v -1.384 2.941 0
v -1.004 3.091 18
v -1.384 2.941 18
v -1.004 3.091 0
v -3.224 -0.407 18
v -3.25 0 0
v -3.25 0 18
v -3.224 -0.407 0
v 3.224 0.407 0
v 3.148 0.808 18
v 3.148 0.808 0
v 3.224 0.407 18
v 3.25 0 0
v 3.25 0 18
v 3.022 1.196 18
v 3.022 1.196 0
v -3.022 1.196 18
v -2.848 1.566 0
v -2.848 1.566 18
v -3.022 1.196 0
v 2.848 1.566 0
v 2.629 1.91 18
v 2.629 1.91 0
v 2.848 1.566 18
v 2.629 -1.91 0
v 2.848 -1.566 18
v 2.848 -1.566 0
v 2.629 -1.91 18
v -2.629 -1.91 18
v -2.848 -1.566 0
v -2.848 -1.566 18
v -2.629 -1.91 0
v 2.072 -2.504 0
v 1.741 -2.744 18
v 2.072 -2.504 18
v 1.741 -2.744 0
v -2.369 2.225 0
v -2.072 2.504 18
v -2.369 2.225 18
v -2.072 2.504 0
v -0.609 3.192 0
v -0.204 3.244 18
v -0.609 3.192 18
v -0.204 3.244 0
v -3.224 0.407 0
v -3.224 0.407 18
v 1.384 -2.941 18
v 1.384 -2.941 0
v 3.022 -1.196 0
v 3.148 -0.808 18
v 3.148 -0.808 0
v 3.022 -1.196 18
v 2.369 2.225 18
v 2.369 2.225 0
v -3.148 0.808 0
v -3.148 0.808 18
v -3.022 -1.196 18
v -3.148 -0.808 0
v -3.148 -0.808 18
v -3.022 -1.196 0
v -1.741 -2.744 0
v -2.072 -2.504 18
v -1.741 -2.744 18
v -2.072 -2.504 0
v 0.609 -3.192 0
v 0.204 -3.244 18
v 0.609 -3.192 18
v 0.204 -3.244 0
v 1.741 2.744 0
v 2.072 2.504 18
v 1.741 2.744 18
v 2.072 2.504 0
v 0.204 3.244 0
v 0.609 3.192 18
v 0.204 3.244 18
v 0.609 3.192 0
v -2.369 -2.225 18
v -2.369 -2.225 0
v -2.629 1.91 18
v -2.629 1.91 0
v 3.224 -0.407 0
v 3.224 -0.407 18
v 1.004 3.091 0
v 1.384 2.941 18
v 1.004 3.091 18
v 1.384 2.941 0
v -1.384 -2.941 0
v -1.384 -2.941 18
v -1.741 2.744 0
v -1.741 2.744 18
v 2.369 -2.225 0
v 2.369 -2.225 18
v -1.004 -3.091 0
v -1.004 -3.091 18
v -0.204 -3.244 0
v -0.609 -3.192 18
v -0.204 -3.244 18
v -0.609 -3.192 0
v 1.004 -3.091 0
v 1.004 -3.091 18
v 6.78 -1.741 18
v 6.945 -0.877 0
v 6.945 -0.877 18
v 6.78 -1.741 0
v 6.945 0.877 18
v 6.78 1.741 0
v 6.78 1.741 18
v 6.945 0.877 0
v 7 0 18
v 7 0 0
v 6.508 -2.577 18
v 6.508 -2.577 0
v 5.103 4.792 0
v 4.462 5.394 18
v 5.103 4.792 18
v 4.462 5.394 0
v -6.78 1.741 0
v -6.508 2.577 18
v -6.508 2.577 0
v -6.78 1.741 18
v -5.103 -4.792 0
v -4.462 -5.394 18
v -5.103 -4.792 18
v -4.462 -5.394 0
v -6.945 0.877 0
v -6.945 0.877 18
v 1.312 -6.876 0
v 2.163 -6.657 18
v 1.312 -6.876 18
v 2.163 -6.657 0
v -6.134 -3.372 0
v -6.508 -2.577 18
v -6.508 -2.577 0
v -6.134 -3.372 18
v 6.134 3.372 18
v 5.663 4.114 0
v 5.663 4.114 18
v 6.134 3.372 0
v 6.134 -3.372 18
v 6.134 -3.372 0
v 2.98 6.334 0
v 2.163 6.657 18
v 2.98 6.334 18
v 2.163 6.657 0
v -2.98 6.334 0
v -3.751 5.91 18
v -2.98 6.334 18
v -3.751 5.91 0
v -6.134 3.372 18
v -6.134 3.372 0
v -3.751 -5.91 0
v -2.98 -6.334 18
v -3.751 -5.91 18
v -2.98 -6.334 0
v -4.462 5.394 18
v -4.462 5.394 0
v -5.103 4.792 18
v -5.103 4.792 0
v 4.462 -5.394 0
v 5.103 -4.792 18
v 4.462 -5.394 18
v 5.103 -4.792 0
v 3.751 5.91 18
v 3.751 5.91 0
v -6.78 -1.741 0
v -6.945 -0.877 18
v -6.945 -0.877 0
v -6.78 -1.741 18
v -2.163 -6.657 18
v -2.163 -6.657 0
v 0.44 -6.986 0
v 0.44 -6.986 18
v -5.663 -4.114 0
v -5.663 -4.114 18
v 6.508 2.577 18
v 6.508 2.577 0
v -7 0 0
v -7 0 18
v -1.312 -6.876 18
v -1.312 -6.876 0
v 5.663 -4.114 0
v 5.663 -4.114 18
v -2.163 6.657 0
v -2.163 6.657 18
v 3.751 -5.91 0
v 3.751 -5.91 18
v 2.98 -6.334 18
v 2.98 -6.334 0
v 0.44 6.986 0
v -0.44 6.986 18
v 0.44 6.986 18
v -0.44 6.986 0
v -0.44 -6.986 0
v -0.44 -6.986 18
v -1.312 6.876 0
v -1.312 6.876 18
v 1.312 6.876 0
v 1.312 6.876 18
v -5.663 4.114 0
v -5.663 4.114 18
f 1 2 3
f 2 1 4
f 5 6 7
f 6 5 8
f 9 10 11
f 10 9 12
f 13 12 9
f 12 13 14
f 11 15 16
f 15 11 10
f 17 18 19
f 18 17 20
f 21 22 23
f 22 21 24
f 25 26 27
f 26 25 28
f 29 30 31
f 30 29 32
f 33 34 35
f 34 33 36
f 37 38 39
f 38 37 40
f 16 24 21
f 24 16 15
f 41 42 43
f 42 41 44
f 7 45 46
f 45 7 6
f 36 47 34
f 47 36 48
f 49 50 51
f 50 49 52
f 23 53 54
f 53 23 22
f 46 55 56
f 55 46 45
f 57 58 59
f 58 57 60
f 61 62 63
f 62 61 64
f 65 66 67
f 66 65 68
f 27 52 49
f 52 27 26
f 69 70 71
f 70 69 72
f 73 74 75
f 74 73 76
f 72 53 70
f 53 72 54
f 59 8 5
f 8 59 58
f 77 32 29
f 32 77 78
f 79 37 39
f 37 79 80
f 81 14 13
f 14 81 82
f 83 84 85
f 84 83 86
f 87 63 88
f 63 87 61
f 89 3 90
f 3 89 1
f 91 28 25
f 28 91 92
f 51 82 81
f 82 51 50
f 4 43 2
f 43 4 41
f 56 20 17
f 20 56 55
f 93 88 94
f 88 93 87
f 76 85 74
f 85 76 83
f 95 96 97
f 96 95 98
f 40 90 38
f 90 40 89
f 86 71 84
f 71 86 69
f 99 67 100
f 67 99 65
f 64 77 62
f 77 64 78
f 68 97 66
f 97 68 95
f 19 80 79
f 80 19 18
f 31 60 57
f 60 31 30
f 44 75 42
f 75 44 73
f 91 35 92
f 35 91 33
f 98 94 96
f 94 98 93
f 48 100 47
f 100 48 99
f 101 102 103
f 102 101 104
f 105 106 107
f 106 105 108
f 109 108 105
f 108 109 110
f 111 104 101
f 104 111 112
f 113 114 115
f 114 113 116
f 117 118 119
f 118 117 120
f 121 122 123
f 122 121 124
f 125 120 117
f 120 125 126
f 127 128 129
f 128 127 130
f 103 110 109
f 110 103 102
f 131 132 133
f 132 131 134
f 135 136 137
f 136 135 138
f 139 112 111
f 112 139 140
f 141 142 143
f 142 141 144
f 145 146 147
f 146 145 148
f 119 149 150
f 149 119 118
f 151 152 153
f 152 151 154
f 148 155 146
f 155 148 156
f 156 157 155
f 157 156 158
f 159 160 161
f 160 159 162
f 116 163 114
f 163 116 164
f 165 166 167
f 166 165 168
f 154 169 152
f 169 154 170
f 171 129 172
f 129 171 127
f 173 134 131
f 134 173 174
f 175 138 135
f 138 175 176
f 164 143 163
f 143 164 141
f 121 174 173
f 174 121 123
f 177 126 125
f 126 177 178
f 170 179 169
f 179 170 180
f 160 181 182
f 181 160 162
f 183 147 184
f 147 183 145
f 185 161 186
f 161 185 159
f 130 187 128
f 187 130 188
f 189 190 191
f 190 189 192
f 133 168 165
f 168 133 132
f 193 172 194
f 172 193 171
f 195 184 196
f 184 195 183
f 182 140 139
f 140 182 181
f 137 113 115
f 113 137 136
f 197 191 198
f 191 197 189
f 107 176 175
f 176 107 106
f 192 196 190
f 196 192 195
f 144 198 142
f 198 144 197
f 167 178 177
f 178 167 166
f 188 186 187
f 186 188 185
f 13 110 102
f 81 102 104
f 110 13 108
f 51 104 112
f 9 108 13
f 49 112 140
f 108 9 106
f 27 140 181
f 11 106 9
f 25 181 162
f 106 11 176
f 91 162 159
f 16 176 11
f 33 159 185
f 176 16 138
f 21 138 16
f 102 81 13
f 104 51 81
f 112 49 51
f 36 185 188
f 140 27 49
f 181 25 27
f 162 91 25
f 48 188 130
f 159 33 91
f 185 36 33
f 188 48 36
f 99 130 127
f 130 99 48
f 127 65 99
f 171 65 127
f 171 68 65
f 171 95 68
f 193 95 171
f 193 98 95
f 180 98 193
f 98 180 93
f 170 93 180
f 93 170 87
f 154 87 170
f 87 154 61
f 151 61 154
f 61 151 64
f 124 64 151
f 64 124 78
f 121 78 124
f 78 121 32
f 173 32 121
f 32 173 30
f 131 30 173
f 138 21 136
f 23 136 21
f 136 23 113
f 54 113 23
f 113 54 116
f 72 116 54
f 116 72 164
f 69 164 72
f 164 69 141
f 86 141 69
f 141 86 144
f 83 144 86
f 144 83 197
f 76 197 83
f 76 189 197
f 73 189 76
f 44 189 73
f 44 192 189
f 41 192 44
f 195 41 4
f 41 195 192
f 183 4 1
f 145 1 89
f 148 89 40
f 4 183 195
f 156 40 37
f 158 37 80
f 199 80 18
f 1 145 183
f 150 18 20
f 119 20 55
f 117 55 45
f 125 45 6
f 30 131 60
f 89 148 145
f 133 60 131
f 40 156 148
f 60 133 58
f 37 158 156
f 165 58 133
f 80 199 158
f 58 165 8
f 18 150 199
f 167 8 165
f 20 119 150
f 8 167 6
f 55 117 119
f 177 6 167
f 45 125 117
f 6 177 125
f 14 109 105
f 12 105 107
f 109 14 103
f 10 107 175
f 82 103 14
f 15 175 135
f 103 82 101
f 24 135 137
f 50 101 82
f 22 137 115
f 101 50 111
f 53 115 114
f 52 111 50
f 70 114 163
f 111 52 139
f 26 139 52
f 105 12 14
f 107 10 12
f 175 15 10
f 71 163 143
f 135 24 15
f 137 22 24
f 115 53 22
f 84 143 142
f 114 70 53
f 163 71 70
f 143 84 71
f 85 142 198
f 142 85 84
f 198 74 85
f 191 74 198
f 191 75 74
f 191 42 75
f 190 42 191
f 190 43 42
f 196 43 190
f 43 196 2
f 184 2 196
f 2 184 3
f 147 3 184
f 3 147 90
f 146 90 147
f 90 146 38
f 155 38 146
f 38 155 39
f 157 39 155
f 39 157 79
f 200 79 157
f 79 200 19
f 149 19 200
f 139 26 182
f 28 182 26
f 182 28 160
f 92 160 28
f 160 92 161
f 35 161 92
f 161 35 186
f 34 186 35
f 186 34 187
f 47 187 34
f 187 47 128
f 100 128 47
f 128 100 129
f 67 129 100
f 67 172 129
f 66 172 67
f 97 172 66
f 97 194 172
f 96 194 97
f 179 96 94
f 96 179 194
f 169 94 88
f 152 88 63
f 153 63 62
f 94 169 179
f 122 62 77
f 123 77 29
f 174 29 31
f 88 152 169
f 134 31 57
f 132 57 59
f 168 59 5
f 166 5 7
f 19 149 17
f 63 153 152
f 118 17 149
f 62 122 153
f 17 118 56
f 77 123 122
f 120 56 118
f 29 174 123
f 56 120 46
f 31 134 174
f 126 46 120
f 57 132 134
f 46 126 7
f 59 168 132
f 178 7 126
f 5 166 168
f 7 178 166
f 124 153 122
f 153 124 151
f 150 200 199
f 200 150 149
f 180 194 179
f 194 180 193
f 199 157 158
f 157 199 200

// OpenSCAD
$fn = 50;


difference() {
	union() {
		*color(alpha = 1.0000000000, c = "gray") {
			translate(v = [0, 7, 0]) {
				linear_extrude(height = 1) {
					text(font = "Arial:style=Bold", halign = "center", size = 4.5000000000, text = "COMMENT plate main", valign = "center");
				}
			}
		}
		cylinder(h = 18, r = 7.0000000000);
	}
	union() {
		*color(alpha = 1.0000000000, c = "gray") {
			translate(v = [0, 7, 0]) {
				linear_extrude(height = 1) {
					text(font = "Arial:style=Bold", halign = "center", size = 4.5000000000, text = "COMMENT holes main", valign = "center");
				}
			}
		}
		translate(v = [0, 0, -100]) {
			cylinder(h = 200, r = 3.2500000000);
		}
		translate(v = [0, 0, -100]) {
			cylinder(h = 200, r = 1.8000000000);
		}
	}
}
